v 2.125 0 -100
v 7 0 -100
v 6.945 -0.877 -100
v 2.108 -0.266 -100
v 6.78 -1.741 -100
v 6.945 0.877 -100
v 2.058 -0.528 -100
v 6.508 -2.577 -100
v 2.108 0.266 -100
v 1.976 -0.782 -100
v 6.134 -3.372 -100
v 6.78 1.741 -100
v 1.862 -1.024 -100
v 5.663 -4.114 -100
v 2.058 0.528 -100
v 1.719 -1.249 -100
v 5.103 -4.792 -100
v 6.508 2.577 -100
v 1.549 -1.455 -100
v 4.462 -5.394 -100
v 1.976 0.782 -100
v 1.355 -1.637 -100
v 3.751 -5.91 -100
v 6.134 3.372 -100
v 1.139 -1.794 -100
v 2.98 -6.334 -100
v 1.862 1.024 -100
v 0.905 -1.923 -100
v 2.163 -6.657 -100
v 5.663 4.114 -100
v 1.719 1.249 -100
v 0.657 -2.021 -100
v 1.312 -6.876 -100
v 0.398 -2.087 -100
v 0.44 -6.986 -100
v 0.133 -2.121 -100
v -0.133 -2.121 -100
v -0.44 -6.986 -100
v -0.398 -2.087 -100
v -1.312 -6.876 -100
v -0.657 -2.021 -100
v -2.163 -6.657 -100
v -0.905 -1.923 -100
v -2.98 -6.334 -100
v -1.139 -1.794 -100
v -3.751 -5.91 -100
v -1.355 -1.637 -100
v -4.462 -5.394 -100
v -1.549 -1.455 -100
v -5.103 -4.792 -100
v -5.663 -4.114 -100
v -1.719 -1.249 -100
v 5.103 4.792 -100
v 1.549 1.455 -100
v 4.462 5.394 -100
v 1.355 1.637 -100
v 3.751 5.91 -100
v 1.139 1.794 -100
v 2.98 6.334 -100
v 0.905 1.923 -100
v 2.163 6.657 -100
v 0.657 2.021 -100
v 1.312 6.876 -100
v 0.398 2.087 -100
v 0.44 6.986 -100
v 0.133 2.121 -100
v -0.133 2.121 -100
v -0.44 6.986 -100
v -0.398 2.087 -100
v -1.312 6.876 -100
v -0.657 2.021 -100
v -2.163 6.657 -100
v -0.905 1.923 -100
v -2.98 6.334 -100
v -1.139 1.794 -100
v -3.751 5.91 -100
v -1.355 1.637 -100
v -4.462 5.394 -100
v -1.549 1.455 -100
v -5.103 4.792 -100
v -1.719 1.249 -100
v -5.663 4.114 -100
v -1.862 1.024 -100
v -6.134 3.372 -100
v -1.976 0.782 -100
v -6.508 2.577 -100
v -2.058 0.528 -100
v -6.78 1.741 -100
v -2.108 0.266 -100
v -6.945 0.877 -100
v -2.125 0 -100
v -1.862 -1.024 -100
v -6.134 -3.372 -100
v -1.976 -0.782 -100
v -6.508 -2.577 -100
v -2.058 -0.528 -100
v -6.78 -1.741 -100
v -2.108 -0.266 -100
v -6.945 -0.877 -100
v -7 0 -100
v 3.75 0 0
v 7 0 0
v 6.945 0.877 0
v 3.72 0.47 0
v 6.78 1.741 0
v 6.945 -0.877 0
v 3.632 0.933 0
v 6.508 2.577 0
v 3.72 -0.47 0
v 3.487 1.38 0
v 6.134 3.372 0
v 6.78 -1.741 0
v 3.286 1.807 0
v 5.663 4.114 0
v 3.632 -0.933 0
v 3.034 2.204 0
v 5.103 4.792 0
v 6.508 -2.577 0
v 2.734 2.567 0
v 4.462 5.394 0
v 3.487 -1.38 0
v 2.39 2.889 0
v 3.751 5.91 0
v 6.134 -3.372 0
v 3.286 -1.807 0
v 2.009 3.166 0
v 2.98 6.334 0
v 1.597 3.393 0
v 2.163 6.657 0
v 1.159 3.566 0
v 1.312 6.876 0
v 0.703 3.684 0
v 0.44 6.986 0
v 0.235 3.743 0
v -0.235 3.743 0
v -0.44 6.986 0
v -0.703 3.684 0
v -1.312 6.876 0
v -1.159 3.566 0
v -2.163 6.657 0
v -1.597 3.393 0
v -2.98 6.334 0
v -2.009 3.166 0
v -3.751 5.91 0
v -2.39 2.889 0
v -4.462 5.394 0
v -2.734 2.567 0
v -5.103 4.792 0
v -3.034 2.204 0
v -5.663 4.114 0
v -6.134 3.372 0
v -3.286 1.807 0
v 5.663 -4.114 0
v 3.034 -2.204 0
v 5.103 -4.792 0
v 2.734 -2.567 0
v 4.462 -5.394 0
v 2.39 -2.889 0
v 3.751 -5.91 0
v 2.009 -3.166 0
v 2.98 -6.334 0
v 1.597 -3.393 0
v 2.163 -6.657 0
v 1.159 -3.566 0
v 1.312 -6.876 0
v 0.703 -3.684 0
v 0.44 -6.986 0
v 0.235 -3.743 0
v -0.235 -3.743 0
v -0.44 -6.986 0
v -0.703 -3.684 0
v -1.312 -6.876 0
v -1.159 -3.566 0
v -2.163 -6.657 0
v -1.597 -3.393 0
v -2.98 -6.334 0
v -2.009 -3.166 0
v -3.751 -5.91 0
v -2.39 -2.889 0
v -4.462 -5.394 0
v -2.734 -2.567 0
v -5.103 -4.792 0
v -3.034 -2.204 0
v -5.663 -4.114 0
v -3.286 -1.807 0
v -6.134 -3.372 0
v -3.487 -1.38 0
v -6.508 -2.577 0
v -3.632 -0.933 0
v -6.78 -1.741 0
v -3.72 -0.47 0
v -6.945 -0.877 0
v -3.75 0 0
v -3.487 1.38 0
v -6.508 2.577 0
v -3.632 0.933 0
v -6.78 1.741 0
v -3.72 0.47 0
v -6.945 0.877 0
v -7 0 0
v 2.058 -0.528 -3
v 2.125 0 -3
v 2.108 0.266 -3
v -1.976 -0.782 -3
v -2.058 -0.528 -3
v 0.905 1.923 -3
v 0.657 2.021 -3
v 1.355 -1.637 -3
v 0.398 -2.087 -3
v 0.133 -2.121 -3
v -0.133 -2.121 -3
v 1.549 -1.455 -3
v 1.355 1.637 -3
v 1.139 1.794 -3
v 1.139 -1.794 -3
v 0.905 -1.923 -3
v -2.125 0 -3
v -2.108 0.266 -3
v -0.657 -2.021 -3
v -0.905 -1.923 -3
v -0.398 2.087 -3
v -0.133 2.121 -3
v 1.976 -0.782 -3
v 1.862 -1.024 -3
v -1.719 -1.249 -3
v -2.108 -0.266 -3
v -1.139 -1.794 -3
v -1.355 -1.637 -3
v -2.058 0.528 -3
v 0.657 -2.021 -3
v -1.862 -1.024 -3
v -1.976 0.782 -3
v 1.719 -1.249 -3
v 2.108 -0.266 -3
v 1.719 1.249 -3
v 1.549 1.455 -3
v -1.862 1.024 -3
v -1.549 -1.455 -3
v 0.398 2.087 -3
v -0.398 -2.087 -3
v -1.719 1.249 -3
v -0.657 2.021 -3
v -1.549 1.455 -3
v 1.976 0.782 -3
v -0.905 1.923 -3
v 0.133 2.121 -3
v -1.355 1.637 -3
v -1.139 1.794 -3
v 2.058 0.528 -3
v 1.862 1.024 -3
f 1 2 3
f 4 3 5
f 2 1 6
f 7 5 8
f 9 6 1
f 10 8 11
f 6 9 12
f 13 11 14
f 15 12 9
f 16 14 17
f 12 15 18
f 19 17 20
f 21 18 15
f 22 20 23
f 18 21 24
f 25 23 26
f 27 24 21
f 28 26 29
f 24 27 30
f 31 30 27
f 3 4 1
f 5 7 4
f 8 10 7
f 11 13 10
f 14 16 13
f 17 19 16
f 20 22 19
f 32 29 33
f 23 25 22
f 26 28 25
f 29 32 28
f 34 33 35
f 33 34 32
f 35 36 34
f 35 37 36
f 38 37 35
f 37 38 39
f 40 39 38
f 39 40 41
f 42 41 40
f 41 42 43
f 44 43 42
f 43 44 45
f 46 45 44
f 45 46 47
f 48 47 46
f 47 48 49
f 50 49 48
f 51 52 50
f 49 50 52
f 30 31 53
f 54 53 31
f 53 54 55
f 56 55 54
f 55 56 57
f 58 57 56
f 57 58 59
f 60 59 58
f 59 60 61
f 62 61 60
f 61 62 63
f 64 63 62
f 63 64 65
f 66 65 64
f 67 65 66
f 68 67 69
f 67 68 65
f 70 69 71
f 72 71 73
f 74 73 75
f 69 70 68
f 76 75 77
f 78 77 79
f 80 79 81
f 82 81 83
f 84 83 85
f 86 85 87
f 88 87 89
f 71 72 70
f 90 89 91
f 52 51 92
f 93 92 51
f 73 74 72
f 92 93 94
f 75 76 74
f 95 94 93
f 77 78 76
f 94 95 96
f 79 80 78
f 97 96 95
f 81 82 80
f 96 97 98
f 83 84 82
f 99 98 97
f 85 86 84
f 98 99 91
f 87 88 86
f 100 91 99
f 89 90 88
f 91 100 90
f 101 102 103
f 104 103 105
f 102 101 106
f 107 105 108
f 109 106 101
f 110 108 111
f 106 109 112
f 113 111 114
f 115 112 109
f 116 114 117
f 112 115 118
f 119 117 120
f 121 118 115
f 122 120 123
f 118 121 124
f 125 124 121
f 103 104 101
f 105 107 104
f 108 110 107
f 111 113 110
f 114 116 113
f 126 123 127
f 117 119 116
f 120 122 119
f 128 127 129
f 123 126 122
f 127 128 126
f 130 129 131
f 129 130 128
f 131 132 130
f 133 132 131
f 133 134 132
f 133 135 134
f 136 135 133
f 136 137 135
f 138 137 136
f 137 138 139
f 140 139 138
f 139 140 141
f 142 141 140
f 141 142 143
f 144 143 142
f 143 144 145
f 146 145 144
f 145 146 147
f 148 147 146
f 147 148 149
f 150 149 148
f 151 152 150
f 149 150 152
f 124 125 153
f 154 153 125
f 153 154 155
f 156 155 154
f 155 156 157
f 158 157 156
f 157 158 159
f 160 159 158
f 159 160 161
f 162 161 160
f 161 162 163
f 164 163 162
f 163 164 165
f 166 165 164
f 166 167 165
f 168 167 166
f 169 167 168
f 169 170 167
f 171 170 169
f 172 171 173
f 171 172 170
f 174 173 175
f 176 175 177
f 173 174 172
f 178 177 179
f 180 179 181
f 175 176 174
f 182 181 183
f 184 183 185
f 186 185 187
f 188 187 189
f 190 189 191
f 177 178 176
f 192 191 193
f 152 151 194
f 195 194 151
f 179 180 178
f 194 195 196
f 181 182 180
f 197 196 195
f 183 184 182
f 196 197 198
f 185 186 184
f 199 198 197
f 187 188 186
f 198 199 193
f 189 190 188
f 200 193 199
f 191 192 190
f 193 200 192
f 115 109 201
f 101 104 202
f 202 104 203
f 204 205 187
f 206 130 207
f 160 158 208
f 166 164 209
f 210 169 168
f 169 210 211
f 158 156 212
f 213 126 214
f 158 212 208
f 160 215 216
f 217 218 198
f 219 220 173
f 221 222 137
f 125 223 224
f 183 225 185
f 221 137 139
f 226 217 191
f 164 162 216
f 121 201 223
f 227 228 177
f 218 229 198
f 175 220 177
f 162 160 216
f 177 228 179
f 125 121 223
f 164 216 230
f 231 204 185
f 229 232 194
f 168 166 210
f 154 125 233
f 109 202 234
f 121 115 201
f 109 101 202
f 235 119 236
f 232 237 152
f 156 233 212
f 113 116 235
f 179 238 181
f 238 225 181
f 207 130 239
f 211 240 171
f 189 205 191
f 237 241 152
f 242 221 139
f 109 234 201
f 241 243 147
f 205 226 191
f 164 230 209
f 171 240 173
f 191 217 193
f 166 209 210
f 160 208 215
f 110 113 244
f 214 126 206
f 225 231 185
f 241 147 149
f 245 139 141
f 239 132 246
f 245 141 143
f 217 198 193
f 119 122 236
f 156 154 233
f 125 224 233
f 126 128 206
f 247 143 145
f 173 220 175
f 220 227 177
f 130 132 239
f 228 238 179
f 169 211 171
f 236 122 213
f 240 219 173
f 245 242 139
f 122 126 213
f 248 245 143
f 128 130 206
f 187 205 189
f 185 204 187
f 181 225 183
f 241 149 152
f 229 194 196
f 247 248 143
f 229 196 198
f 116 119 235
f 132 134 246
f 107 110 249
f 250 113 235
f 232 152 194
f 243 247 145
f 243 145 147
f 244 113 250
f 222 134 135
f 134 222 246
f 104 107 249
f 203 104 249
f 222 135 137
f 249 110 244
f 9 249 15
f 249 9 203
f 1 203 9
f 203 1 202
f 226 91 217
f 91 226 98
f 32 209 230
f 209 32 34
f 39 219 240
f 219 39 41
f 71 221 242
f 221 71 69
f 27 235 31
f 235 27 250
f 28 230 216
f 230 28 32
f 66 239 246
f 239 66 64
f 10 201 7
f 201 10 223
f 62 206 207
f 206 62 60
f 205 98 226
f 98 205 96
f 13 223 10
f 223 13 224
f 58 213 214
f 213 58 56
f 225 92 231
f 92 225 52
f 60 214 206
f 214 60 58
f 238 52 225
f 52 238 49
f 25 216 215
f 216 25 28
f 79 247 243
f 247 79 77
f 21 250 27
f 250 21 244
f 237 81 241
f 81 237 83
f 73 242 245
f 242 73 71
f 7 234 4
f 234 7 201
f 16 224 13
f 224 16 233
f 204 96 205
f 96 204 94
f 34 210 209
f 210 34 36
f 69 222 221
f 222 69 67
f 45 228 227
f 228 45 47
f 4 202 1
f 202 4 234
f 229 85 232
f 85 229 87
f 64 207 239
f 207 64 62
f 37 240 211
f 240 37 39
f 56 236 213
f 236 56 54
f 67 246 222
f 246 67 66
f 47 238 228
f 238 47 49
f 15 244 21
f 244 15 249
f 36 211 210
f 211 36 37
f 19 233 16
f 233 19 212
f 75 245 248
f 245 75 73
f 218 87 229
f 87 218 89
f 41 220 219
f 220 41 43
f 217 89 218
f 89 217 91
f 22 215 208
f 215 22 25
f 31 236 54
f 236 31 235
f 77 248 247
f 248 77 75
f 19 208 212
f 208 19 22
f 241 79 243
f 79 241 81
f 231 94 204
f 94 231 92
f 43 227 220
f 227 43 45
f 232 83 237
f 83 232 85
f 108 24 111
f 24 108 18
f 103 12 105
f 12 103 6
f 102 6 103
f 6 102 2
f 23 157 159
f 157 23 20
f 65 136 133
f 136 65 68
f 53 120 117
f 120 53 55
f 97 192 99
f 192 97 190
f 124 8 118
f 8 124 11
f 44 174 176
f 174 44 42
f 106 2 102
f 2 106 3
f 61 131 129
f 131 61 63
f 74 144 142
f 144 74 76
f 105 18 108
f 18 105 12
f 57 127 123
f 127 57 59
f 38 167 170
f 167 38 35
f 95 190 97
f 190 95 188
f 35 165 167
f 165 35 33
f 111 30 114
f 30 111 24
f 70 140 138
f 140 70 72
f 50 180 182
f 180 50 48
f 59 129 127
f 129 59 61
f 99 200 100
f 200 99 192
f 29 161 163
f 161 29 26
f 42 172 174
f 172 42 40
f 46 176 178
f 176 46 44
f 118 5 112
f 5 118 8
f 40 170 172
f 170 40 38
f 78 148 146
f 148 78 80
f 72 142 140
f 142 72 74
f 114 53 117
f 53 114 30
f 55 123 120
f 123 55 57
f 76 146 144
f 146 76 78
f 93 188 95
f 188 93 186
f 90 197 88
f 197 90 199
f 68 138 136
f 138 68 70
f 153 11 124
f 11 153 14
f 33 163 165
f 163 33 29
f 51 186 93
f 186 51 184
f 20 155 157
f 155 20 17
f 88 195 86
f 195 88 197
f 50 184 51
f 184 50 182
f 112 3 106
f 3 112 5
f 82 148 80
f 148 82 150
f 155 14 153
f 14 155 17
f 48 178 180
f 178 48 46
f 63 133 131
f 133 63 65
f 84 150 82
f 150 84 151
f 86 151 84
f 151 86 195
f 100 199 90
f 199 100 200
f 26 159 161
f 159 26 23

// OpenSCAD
$fn = 50;


difference() {
	union() {
		translate(v = [0, 0, -100.0000000000]) {
			cylinder(h = 100, r = 7.0000000000);
		}
		cylinder(h = 0, r = 13.0000000000);
	}
	union() {
		translate(v = [0, 0, 0]) {
			rotate(a = [0, 0, 0]) {
				difference() {
					union() {
						#translate(v = [0, 0, -100.0000000000]) {
							cylinder(h = 100, r = 2.0000000000);
						}
						#translate(v = [0, 0, -3]) {
							cylinder(h = 3, r = 7.0000000000, r1 = 2.1250000000, r2 = 3.7500000000);
						}
						#translate(v = [0, 0, -100.0000000000]) {
							cylinder(h = 100, r = 2.1250000000);
						}
						#translate(v = [0, 0, -100.0000000000]) {
							cylinder(h = 100, r = 2.0000000000);
						}
					}
					union();
				}
			}
		}
	}
}
